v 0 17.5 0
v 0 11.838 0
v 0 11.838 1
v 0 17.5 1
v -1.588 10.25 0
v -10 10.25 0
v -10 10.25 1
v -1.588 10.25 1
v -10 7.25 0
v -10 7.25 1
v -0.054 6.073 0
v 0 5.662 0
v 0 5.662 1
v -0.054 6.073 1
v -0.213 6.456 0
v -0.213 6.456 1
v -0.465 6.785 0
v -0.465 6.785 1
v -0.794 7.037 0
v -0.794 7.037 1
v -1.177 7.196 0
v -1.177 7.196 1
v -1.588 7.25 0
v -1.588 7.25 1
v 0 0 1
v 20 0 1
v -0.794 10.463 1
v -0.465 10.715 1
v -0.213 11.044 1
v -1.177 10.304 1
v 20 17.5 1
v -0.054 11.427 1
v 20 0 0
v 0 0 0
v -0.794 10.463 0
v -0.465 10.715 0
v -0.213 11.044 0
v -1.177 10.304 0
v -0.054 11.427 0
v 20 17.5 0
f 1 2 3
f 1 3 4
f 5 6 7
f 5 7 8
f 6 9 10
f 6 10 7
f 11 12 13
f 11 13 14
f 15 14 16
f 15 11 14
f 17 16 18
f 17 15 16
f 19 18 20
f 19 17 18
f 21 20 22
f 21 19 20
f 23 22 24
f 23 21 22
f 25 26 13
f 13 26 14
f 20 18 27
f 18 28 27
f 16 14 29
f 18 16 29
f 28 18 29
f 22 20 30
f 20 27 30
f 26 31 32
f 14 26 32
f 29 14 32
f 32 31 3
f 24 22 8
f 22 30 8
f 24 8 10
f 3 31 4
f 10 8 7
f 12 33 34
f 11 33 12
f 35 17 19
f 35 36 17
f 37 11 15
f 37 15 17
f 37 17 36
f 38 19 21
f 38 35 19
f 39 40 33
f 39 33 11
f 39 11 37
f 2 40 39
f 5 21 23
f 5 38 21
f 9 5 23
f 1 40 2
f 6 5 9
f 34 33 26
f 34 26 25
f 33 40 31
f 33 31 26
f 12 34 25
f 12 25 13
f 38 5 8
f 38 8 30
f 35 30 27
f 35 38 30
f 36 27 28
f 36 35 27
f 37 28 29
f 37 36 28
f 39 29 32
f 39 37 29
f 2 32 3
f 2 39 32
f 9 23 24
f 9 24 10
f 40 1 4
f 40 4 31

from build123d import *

# Parameters (mm, degrees)
BOSS_EXTRUDE1_DEPTH = 1


with BuildPart() as part:
    # Sketch1 → Boss-Extrude1 (new body)
    with BuildSketch(Plane.XY):
        with BuildLine():
            Line((0, 11.8375), (0, 17.5))
            Line((0, 17.5), (20, 17.5))
            Line((20, 17.5), (20, 0))
            Line((20, 0), (0, 0))
            Line((0, 0), (0, 5.6625))
            ThreePointArc((0, 5.6625), (-0.464967985, 6.785032015), (-1.5875, 7.25))
            Line((-1.5875, 7.25), (-10, 7.25))
            Line((-10, 7.25), (-10, 10.25))
            Line((-10, 10.25), (-1.5875, 10.25))
            ThreePointArc((-1.5875, 10.25), (-0.464967985, 10.714967985), (0, 11.8375))
        make_face()
    extrude(amount=BOSS_EXTRUDE1_DEPTH)


solid = part.part
